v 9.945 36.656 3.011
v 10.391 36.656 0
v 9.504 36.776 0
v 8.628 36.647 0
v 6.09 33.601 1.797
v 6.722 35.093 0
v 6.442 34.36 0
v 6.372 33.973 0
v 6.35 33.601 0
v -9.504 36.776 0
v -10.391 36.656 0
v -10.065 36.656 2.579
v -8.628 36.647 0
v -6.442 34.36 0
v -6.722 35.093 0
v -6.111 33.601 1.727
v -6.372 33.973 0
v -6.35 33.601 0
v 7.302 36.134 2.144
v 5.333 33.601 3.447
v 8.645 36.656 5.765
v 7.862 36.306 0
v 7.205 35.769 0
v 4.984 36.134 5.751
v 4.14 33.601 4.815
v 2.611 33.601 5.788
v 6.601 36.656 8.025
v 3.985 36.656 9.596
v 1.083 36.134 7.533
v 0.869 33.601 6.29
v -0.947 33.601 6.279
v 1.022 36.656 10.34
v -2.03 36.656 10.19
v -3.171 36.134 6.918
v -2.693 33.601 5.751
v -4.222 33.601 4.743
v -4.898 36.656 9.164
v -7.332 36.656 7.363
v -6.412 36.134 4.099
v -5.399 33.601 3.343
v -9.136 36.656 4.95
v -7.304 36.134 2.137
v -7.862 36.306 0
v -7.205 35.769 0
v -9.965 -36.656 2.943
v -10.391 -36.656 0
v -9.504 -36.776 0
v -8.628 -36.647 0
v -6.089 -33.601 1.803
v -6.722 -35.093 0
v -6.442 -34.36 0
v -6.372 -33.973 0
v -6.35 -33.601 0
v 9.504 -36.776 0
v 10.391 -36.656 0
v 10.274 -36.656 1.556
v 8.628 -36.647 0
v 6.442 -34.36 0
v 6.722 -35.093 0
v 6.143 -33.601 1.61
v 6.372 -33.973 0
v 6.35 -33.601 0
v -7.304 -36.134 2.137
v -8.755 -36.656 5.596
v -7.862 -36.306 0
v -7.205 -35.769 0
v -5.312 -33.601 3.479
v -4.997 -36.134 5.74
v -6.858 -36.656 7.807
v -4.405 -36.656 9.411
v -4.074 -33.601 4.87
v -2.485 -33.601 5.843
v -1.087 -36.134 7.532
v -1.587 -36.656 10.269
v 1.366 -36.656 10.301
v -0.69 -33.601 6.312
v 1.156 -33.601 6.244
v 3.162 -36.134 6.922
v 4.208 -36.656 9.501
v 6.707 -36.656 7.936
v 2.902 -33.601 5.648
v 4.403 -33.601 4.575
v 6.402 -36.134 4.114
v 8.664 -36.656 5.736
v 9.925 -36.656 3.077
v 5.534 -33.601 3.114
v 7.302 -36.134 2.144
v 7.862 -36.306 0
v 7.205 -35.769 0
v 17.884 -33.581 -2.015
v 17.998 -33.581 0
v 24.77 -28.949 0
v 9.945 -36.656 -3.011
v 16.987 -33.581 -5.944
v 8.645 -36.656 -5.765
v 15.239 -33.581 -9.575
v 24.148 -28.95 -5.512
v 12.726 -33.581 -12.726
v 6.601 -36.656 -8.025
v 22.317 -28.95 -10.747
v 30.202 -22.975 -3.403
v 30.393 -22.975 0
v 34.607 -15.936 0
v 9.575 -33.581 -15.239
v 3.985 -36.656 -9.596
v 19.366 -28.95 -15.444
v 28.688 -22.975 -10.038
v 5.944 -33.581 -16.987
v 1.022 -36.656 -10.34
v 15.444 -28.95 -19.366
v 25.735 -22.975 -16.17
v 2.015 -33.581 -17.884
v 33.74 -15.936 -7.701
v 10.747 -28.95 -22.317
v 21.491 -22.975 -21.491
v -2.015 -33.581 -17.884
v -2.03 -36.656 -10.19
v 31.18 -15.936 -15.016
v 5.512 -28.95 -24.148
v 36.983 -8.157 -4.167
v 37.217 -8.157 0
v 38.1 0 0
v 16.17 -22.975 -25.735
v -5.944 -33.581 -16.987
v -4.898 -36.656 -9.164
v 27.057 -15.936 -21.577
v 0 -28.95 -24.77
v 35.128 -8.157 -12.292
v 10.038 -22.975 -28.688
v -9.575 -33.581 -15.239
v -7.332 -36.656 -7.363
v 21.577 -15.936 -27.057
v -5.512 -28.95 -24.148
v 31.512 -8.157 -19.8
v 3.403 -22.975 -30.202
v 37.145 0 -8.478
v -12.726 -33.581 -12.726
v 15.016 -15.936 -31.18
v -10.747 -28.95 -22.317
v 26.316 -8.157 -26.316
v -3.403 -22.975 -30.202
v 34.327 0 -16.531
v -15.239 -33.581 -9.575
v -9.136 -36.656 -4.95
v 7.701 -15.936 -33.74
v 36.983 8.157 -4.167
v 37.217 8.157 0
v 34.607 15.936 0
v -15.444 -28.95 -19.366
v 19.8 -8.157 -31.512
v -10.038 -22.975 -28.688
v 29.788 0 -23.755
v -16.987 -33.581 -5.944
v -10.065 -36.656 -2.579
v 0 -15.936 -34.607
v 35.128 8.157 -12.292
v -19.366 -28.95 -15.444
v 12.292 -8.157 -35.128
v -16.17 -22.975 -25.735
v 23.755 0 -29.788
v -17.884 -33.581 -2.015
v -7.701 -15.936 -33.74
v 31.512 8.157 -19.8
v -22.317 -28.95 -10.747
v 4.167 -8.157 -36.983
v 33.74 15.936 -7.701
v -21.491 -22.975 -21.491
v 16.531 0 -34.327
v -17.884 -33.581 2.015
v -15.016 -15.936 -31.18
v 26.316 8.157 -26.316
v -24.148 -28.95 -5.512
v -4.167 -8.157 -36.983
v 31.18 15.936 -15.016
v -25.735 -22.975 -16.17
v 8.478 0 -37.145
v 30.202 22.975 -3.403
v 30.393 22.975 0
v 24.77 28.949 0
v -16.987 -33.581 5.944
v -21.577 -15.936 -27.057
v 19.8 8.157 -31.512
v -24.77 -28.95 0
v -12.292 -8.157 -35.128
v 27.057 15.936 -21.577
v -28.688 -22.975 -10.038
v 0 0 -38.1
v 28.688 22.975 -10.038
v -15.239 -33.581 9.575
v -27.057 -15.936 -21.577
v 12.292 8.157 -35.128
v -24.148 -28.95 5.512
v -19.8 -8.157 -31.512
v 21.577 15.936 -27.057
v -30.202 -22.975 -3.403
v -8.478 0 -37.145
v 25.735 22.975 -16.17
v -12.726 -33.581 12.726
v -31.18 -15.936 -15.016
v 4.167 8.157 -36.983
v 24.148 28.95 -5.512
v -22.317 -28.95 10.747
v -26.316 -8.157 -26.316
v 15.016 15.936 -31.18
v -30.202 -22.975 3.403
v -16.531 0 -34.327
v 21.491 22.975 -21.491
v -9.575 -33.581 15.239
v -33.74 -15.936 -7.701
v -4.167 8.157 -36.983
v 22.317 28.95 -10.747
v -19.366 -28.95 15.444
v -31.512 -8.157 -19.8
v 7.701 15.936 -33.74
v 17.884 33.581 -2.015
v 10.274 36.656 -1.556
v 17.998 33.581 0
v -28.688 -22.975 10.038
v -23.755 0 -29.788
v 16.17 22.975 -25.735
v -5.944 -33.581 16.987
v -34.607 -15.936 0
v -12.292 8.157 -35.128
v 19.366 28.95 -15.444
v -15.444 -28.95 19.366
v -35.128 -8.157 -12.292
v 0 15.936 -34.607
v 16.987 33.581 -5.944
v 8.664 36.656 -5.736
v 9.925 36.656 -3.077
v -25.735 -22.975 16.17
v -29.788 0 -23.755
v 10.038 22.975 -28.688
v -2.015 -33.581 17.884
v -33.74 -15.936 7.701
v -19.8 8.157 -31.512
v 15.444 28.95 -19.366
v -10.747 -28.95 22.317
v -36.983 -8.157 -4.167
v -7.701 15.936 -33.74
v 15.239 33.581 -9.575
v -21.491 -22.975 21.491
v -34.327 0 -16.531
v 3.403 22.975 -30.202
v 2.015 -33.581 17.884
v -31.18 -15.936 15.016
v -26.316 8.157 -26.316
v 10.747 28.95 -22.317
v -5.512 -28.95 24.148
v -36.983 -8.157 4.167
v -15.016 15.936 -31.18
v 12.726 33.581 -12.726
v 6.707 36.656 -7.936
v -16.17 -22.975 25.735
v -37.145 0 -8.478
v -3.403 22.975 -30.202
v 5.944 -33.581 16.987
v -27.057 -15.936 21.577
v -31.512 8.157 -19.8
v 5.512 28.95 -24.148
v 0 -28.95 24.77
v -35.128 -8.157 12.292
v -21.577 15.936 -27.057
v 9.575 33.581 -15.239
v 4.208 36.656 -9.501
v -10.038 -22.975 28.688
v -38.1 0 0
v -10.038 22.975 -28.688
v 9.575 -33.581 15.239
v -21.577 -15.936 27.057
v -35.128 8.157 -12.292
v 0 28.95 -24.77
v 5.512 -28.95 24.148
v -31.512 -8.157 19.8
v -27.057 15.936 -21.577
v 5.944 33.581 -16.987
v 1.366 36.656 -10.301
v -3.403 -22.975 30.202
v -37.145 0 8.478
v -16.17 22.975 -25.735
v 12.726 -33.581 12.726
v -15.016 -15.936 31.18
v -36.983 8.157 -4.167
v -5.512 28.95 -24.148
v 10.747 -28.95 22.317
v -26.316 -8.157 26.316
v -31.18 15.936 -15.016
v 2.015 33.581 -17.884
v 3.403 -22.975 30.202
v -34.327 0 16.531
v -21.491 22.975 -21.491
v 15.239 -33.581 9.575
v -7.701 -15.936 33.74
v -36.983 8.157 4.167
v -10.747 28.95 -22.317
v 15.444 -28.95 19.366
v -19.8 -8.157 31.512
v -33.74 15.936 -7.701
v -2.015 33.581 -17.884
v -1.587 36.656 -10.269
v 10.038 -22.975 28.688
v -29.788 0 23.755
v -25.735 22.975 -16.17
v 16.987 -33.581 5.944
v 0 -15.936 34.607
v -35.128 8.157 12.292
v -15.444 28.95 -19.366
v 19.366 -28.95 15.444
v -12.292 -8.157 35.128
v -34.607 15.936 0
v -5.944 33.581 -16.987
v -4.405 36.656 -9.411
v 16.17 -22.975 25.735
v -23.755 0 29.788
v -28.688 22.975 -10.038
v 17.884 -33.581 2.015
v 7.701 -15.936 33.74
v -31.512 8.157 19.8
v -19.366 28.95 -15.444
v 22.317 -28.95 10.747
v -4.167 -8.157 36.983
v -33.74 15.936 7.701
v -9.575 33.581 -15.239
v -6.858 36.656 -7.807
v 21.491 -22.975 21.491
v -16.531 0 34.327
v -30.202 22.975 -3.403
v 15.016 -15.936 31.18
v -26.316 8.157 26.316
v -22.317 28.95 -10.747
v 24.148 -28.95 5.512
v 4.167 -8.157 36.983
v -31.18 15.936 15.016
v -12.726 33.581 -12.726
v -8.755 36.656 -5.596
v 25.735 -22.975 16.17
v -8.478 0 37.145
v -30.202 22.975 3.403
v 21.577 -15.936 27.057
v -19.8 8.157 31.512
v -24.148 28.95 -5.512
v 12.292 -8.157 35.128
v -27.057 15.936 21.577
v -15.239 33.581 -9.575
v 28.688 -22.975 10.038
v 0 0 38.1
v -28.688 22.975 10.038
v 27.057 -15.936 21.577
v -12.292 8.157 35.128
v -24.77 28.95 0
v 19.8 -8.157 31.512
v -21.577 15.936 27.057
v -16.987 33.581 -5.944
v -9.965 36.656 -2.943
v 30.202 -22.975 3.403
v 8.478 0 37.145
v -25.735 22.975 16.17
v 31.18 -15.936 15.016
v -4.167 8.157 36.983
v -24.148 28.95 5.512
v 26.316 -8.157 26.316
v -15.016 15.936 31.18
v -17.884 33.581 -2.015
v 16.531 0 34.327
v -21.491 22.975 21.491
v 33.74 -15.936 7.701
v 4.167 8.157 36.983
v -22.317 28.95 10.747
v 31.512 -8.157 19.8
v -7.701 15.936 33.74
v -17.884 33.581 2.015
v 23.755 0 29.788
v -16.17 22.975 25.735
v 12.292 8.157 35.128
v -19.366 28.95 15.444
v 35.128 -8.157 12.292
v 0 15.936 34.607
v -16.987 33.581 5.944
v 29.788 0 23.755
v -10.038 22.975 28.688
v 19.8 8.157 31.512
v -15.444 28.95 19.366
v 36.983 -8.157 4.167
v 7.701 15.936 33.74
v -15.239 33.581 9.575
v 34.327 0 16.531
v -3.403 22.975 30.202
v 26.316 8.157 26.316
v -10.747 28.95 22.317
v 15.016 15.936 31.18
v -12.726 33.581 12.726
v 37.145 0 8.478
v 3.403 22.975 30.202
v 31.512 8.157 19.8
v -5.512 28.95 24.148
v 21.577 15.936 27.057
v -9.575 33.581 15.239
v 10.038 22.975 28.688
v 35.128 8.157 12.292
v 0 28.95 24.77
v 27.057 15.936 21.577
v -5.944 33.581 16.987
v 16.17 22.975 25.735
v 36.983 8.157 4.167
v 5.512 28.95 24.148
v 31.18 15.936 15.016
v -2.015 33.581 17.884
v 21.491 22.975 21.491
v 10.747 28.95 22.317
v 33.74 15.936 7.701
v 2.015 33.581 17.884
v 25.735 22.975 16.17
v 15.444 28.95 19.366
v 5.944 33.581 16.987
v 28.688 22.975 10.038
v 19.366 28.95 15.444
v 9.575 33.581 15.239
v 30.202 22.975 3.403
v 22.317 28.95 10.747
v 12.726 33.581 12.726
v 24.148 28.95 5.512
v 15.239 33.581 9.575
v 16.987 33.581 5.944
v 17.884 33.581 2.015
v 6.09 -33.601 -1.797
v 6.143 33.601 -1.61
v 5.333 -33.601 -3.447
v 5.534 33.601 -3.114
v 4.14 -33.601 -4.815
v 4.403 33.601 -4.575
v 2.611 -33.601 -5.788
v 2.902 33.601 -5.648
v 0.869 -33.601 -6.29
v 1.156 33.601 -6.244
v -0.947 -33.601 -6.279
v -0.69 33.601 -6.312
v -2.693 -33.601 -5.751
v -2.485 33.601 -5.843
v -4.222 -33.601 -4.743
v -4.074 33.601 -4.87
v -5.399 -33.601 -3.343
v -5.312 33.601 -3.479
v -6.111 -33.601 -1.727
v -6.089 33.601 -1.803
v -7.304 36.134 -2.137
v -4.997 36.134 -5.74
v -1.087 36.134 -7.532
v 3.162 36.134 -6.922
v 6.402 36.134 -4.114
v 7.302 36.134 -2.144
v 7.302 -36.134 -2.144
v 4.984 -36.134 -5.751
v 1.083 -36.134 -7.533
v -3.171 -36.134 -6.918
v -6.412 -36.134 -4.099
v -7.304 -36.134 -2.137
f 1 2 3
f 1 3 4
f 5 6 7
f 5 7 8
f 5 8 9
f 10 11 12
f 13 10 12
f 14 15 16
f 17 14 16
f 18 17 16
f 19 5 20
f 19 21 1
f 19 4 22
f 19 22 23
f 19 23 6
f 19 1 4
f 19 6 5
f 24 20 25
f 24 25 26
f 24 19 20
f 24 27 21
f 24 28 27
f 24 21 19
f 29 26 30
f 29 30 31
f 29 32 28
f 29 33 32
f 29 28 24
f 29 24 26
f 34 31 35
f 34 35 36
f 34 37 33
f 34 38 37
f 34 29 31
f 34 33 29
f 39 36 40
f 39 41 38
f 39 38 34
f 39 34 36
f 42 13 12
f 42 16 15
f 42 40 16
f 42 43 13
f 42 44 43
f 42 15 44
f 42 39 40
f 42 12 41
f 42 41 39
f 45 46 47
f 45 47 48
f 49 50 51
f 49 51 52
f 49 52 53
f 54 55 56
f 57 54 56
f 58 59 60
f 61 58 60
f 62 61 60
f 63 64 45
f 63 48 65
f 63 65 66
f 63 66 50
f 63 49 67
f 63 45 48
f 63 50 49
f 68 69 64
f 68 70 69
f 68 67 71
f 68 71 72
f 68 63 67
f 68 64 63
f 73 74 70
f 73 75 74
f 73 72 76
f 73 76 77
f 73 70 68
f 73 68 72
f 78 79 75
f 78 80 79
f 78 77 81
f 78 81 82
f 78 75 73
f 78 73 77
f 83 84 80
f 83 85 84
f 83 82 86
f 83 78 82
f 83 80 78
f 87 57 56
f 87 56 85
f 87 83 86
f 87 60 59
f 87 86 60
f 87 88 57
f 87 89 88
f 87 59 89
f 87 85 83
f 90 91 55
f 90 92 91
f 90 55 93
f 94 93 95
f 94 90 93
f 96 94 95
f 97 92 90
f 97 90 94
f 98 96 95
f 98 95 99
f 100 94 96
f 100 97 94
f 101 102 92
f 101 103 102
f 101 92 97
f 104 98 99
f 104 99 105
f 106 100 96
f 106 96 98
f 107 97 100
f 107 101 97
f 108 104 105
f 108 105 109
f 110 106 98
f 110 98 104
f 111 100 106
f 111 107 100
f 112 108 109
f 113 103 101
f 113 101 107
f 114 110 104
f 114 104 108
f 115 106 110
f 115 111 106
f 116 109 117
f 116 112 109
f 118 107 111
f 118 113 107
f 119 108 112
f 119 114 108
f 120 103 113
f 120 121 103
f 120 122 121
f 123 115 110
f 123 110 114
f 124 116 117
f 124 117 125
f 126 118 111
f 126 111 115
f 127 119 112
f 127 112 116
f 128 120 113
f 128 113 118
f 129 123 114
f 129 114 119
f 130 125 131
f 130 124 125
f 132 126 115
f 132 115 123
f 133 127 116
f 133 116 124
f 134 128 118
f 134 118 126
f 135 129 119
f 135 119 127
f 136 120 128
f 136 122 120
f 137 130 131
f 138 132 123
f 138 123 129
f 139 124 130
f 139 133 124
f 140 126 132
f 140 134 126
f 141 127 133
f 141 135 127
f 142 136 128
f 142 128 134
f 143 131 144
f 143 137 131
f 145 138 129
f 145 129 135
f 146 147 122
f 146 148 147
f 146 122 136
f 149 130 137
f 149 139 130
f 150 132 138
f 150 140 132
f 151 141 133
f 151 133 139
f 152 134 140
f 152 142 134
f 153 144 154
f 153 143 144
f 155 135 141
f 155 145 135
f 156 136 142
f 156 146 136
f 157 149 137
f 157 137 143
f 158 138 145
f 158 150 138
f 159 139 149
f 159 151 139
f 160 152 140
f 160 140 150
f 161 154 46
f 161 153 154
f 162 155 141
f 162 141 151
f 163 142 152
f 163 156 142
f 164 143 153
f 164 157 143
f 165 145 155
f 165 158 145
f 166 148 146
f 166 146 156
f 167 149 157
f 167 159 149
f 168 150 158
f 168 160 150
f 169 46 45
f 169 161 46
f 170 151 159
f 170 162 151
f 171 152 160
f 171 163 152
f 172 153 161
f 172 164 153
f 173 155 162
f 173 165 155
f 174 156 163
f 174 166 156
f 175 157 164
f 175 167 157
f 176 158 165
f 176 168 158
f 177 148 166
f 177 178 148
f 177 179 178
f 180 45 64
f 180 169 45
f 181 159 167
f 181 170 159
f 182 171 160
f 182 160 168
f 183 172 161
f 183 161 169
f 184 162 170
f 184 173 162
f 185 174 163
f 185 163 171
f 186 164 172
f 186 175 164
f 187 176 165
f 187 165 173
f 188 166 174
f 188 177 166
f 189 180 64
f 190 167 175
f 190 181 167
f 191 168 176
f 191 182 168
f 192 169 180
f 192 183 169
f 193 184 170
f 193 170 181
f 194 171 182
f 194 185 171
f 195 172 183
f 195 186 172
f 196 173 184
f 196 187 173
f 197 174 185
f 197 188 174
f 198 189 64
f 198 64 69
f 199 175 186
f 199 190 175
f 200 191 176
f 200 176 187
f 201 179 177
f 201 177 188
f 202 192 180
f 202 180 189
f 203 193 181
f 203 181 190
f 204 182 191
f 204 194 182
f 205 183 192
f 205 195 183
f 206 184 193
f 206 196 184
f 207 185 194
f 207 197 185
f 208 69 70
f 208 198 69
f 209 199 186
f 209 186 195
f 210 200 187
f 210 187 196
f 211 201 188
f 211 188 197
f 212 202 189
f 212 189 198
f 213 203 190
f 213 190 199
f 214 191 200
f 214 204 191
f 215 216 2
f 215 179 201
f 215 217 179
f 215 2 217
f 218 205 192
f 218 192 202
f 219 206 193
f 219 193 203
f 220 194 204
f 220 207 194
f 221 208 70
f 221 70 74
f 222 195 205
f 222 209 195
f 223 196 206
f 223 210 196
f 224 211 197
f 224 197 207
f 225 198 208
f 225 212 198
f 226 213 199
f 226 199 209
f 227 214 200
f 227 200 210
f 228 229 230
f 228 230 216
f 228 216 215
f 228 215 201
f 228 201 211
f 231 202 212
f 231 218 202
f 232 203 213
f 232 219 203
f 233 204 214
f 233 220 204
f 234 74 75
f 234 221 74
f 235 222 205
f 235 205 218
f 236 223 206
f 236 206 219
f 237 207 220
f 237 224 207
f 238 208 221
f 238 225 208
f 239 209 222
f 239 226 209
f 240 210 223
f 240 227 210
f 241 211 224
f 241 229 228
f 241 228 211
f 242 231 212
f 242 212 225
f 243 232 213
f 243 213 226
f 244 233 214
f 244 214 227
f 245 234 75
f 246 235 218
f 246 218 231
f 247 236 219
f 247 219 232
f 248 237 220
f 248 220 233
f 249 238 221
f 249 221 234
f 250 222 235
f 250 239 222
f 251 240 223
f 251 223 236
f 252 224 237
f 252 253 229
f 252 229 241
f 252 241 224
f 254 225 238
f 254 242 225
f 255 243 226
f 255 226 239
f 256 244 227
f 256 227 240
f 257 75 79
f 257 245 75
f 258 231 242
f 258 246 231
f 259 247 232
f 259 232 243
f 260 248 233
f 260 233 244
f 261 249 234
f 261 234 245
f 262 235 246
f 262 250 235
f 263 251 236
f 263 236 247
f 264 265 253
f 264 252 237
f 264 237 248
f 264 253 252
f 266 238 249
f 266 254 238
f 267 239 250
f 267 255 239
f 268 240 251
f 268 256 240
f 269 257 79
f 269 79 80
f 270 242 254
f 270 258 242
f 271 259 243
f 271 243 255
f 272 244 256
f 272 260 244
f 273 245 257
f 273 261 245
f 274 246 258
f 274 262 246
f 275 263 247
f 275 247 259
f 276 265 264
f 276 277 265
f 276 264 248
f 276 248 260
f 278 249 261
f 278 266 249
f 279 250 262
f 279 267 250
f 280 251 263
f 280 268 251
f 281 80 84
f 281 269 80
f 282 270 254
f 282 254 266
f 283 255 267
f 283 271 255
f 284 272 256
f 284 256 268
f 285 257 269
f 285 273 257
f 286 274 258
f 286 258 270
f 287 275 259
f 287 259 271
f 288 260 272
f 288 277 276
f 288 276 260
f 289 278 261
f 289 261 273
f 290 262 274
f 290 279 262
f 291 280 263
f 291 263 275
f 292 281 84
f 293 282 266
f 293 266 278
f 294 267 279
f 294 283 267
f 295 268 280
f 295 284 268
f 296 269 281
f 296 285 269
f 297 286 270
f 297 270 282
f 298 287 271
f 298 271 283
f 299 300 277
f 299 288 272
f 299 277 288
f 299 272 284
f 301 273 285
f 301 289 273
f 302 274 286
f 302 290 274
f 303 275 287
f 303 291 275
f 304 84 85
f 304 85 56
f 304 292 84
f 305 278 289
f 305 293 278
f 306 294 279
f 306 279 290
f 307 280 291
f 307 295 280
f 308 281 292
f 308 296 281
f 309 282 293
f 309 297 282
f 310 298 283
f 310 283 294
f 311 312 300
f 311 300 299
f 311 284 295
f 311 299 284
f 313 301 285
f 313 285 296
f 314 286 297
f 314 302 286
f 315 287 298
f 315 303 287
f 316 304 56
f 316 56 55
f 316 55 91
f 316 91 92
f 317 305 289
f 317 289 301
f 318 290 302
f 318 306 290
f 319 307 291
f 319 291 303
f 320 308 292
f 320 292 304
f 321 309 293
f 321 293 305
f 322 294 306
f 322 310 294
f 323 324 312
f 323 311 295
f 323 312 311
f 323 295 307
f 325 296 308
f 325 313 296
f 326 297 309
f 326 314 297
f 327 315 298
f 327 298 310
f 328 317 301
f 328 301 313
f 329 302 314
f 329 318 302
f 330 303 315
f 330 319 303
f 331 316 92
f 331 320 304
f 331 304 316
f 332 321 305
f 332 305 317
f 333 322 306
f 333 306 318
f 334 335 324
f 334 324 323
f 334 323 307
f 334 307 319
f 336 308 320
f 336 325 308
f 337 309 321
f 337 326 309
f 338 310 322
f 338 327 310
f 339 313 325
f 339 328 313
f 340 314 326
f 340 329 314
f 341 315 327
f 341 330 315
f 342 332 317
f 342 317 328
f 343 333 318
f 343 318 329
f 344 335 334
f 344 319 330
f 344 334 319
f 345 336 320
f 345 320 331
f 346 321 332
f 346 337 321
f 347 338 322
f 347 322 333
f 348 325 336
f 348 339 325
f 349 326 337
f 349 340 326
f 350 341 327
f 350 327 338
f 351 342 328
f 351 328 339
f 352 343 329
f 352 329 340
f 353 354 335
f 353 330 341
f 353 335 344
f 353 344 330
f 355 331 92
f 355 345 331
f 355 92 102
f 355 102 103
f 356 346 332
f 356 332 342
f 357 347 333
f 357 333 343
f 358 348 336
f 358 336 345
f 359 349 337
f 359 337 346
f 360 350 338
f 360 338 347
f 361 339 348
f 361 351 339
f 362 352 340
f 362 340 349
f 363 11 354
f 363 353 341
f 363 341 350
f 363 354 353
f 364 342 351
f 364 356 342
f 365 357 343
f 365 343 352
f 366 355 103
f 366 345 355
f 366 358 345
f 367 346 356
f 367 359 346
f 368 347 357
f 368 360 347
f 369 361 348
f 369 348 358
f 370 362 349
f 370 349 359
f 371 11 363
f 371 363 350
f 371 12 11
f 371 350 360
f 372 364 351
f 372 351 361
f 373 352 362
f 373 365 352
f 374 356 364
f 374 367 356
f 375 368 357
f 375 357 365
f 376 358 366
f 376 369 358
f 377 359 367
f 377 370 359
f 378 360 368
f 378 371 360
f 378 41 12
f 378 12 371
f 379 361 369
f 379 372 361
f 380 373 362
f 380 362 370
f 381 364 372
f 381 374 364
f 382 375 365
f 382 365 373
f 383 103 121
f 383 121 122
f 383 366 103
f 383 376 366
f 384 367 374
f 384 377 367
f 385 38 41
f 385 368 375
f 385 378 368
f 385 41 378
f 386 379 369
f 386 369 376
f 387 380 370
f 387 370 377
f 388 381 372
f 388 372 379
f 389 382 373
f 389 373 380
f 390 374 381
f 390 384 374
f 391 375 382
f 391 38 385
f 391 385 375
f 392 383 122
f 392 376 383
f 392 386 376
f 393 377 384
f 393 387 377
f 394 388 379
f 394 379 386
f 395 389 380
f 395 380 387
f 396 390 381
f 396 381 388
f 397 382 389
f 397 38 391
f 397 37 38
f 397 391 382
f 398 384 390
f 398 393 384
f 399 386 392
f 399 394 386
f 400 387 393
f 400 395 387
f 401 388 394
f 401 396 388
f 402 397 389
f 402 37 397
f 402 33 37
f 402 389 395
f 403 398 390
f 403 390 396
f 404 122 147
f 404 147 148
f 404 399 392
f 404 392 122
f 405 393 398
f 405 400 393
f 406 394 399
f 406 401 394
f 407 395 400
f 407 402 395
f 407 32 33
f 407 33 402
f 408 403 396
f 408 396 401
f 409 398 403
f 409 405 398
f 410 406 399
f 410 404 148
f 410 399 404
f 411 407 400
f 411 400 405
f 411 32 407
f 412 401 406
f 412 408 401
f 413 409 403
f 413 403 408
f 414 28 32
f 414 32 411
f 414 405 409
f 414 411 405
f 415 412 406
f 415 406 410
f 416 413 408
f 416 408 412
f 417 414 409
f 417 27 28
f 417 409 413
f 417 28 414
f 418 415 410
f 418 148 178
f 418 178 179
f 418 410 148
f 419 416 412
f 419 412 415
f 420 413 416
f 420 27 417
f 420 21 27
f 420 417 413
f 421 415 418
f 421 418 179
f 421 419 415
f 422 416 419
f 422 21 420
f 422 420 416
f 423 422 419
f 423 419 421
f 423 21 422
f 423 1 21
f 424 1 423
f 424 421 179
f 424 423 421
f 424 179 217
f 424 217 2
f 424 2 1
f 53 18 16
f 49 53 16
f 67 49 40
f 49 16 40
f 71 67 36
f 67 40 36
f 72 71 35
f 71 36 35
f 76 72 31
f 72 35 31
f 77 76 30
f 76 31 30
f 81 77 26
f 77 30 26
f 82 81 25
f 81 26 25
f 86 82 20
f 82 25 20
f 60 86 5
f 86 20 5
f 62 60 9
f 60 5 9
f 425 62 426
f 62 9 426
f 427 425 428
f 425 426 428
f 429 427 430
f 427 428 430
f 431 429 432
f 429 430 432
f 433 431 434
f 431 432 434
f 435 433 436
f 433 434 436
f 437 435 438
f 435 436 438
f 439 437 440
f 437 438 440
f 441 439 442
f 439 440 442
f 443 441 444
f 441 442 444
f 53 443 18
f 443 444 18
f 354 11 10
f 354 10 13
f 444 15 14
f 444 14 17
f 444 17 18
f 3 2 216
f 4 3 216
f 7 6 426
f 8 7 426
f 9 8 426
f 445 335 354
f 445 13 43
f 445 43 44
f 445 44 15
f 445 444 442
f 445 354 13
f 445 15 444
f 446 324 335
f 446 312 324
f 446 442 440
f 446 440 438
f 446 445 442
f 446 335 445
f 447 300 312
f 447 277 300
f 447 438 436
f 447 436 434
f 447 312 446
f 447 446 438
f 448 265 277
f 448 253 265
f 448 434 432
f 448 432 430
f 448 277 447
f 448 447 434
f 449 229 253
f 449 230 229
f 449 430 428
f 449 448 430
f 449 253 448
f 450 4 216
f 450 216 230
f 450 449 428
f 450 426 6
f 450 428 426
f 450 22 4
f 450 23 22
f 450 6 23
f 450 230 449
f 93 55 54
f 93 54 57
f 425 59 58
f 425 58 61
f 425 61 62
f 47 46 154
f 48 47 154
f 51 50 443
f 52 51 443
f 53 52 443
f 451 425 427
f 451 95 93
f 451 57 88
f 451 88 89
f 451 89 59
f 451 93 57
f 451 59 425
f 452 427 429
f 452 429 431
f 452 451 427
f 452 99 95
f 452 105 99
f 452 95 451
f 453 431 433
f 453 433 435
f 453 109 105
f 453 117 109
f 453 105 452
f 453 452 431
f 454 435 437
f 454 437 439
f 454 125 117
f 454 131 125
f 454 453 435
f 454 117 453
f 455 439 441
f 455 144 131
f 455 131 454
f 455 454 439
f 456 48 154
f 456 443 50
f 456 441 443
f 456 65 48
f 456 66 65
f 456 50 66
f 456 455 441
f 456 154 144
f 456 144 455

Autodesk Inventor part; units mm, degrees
ref_plane "YZ Plane" through (0, 0, 0) normal (1, 0, 0) x (0, 1, 0)
ref_plane "XZ Plane" through (0, 0, 0) normal (0, 1, 0) x (-1, 0, 0)
ref_plane "XY Plane" through (0, 0, 0) normal (0, 0, 1) x (1, 0, 0)
sketch "Sketch8" plane through (0, 0, 0) normal (0, 0, 1) x (1, 0, 0)
  arc A0 (0, -38.1) -> (0, 38.1) centre (0, 0) ccw
  line L0 (0, 38.1) -> (0, -38.1)
  line L1 (0, -53.34) -> (0, 53.34) projected
  dimension "d25" = 76.2
revolve "Revolution1" add sketch "Sketch8" angle 360 about axis through (0, -10, 0) along (0, 1, 0)
sketch "Sketch9" plane through (0, 0, 0) normal (0, 1, 0) x (-1, 0, 0)
  circle A0 centre (0, 0) radius 6.35
  dimension "d27" = 12.7
extrude "Extrusion4" cut sketch "Sketch9" along normal mid plane 76.2
fillet "Fillet1" radius 3.175 4 edges at (0, 37.5671, 6.35) (0, 37.5671, -6.35) (0, -37.5671, -6.35) (0, -37.5671, 6.35)
equation "\"d25\" = ballDiam"
equation "\"d27\" = holeDiam"
equation "\"d28\" = ballDiam"
equation "\"ballDiam\" = 76.2"
equation "\"holeDiam\" = 12.7"
properties part number "float"
